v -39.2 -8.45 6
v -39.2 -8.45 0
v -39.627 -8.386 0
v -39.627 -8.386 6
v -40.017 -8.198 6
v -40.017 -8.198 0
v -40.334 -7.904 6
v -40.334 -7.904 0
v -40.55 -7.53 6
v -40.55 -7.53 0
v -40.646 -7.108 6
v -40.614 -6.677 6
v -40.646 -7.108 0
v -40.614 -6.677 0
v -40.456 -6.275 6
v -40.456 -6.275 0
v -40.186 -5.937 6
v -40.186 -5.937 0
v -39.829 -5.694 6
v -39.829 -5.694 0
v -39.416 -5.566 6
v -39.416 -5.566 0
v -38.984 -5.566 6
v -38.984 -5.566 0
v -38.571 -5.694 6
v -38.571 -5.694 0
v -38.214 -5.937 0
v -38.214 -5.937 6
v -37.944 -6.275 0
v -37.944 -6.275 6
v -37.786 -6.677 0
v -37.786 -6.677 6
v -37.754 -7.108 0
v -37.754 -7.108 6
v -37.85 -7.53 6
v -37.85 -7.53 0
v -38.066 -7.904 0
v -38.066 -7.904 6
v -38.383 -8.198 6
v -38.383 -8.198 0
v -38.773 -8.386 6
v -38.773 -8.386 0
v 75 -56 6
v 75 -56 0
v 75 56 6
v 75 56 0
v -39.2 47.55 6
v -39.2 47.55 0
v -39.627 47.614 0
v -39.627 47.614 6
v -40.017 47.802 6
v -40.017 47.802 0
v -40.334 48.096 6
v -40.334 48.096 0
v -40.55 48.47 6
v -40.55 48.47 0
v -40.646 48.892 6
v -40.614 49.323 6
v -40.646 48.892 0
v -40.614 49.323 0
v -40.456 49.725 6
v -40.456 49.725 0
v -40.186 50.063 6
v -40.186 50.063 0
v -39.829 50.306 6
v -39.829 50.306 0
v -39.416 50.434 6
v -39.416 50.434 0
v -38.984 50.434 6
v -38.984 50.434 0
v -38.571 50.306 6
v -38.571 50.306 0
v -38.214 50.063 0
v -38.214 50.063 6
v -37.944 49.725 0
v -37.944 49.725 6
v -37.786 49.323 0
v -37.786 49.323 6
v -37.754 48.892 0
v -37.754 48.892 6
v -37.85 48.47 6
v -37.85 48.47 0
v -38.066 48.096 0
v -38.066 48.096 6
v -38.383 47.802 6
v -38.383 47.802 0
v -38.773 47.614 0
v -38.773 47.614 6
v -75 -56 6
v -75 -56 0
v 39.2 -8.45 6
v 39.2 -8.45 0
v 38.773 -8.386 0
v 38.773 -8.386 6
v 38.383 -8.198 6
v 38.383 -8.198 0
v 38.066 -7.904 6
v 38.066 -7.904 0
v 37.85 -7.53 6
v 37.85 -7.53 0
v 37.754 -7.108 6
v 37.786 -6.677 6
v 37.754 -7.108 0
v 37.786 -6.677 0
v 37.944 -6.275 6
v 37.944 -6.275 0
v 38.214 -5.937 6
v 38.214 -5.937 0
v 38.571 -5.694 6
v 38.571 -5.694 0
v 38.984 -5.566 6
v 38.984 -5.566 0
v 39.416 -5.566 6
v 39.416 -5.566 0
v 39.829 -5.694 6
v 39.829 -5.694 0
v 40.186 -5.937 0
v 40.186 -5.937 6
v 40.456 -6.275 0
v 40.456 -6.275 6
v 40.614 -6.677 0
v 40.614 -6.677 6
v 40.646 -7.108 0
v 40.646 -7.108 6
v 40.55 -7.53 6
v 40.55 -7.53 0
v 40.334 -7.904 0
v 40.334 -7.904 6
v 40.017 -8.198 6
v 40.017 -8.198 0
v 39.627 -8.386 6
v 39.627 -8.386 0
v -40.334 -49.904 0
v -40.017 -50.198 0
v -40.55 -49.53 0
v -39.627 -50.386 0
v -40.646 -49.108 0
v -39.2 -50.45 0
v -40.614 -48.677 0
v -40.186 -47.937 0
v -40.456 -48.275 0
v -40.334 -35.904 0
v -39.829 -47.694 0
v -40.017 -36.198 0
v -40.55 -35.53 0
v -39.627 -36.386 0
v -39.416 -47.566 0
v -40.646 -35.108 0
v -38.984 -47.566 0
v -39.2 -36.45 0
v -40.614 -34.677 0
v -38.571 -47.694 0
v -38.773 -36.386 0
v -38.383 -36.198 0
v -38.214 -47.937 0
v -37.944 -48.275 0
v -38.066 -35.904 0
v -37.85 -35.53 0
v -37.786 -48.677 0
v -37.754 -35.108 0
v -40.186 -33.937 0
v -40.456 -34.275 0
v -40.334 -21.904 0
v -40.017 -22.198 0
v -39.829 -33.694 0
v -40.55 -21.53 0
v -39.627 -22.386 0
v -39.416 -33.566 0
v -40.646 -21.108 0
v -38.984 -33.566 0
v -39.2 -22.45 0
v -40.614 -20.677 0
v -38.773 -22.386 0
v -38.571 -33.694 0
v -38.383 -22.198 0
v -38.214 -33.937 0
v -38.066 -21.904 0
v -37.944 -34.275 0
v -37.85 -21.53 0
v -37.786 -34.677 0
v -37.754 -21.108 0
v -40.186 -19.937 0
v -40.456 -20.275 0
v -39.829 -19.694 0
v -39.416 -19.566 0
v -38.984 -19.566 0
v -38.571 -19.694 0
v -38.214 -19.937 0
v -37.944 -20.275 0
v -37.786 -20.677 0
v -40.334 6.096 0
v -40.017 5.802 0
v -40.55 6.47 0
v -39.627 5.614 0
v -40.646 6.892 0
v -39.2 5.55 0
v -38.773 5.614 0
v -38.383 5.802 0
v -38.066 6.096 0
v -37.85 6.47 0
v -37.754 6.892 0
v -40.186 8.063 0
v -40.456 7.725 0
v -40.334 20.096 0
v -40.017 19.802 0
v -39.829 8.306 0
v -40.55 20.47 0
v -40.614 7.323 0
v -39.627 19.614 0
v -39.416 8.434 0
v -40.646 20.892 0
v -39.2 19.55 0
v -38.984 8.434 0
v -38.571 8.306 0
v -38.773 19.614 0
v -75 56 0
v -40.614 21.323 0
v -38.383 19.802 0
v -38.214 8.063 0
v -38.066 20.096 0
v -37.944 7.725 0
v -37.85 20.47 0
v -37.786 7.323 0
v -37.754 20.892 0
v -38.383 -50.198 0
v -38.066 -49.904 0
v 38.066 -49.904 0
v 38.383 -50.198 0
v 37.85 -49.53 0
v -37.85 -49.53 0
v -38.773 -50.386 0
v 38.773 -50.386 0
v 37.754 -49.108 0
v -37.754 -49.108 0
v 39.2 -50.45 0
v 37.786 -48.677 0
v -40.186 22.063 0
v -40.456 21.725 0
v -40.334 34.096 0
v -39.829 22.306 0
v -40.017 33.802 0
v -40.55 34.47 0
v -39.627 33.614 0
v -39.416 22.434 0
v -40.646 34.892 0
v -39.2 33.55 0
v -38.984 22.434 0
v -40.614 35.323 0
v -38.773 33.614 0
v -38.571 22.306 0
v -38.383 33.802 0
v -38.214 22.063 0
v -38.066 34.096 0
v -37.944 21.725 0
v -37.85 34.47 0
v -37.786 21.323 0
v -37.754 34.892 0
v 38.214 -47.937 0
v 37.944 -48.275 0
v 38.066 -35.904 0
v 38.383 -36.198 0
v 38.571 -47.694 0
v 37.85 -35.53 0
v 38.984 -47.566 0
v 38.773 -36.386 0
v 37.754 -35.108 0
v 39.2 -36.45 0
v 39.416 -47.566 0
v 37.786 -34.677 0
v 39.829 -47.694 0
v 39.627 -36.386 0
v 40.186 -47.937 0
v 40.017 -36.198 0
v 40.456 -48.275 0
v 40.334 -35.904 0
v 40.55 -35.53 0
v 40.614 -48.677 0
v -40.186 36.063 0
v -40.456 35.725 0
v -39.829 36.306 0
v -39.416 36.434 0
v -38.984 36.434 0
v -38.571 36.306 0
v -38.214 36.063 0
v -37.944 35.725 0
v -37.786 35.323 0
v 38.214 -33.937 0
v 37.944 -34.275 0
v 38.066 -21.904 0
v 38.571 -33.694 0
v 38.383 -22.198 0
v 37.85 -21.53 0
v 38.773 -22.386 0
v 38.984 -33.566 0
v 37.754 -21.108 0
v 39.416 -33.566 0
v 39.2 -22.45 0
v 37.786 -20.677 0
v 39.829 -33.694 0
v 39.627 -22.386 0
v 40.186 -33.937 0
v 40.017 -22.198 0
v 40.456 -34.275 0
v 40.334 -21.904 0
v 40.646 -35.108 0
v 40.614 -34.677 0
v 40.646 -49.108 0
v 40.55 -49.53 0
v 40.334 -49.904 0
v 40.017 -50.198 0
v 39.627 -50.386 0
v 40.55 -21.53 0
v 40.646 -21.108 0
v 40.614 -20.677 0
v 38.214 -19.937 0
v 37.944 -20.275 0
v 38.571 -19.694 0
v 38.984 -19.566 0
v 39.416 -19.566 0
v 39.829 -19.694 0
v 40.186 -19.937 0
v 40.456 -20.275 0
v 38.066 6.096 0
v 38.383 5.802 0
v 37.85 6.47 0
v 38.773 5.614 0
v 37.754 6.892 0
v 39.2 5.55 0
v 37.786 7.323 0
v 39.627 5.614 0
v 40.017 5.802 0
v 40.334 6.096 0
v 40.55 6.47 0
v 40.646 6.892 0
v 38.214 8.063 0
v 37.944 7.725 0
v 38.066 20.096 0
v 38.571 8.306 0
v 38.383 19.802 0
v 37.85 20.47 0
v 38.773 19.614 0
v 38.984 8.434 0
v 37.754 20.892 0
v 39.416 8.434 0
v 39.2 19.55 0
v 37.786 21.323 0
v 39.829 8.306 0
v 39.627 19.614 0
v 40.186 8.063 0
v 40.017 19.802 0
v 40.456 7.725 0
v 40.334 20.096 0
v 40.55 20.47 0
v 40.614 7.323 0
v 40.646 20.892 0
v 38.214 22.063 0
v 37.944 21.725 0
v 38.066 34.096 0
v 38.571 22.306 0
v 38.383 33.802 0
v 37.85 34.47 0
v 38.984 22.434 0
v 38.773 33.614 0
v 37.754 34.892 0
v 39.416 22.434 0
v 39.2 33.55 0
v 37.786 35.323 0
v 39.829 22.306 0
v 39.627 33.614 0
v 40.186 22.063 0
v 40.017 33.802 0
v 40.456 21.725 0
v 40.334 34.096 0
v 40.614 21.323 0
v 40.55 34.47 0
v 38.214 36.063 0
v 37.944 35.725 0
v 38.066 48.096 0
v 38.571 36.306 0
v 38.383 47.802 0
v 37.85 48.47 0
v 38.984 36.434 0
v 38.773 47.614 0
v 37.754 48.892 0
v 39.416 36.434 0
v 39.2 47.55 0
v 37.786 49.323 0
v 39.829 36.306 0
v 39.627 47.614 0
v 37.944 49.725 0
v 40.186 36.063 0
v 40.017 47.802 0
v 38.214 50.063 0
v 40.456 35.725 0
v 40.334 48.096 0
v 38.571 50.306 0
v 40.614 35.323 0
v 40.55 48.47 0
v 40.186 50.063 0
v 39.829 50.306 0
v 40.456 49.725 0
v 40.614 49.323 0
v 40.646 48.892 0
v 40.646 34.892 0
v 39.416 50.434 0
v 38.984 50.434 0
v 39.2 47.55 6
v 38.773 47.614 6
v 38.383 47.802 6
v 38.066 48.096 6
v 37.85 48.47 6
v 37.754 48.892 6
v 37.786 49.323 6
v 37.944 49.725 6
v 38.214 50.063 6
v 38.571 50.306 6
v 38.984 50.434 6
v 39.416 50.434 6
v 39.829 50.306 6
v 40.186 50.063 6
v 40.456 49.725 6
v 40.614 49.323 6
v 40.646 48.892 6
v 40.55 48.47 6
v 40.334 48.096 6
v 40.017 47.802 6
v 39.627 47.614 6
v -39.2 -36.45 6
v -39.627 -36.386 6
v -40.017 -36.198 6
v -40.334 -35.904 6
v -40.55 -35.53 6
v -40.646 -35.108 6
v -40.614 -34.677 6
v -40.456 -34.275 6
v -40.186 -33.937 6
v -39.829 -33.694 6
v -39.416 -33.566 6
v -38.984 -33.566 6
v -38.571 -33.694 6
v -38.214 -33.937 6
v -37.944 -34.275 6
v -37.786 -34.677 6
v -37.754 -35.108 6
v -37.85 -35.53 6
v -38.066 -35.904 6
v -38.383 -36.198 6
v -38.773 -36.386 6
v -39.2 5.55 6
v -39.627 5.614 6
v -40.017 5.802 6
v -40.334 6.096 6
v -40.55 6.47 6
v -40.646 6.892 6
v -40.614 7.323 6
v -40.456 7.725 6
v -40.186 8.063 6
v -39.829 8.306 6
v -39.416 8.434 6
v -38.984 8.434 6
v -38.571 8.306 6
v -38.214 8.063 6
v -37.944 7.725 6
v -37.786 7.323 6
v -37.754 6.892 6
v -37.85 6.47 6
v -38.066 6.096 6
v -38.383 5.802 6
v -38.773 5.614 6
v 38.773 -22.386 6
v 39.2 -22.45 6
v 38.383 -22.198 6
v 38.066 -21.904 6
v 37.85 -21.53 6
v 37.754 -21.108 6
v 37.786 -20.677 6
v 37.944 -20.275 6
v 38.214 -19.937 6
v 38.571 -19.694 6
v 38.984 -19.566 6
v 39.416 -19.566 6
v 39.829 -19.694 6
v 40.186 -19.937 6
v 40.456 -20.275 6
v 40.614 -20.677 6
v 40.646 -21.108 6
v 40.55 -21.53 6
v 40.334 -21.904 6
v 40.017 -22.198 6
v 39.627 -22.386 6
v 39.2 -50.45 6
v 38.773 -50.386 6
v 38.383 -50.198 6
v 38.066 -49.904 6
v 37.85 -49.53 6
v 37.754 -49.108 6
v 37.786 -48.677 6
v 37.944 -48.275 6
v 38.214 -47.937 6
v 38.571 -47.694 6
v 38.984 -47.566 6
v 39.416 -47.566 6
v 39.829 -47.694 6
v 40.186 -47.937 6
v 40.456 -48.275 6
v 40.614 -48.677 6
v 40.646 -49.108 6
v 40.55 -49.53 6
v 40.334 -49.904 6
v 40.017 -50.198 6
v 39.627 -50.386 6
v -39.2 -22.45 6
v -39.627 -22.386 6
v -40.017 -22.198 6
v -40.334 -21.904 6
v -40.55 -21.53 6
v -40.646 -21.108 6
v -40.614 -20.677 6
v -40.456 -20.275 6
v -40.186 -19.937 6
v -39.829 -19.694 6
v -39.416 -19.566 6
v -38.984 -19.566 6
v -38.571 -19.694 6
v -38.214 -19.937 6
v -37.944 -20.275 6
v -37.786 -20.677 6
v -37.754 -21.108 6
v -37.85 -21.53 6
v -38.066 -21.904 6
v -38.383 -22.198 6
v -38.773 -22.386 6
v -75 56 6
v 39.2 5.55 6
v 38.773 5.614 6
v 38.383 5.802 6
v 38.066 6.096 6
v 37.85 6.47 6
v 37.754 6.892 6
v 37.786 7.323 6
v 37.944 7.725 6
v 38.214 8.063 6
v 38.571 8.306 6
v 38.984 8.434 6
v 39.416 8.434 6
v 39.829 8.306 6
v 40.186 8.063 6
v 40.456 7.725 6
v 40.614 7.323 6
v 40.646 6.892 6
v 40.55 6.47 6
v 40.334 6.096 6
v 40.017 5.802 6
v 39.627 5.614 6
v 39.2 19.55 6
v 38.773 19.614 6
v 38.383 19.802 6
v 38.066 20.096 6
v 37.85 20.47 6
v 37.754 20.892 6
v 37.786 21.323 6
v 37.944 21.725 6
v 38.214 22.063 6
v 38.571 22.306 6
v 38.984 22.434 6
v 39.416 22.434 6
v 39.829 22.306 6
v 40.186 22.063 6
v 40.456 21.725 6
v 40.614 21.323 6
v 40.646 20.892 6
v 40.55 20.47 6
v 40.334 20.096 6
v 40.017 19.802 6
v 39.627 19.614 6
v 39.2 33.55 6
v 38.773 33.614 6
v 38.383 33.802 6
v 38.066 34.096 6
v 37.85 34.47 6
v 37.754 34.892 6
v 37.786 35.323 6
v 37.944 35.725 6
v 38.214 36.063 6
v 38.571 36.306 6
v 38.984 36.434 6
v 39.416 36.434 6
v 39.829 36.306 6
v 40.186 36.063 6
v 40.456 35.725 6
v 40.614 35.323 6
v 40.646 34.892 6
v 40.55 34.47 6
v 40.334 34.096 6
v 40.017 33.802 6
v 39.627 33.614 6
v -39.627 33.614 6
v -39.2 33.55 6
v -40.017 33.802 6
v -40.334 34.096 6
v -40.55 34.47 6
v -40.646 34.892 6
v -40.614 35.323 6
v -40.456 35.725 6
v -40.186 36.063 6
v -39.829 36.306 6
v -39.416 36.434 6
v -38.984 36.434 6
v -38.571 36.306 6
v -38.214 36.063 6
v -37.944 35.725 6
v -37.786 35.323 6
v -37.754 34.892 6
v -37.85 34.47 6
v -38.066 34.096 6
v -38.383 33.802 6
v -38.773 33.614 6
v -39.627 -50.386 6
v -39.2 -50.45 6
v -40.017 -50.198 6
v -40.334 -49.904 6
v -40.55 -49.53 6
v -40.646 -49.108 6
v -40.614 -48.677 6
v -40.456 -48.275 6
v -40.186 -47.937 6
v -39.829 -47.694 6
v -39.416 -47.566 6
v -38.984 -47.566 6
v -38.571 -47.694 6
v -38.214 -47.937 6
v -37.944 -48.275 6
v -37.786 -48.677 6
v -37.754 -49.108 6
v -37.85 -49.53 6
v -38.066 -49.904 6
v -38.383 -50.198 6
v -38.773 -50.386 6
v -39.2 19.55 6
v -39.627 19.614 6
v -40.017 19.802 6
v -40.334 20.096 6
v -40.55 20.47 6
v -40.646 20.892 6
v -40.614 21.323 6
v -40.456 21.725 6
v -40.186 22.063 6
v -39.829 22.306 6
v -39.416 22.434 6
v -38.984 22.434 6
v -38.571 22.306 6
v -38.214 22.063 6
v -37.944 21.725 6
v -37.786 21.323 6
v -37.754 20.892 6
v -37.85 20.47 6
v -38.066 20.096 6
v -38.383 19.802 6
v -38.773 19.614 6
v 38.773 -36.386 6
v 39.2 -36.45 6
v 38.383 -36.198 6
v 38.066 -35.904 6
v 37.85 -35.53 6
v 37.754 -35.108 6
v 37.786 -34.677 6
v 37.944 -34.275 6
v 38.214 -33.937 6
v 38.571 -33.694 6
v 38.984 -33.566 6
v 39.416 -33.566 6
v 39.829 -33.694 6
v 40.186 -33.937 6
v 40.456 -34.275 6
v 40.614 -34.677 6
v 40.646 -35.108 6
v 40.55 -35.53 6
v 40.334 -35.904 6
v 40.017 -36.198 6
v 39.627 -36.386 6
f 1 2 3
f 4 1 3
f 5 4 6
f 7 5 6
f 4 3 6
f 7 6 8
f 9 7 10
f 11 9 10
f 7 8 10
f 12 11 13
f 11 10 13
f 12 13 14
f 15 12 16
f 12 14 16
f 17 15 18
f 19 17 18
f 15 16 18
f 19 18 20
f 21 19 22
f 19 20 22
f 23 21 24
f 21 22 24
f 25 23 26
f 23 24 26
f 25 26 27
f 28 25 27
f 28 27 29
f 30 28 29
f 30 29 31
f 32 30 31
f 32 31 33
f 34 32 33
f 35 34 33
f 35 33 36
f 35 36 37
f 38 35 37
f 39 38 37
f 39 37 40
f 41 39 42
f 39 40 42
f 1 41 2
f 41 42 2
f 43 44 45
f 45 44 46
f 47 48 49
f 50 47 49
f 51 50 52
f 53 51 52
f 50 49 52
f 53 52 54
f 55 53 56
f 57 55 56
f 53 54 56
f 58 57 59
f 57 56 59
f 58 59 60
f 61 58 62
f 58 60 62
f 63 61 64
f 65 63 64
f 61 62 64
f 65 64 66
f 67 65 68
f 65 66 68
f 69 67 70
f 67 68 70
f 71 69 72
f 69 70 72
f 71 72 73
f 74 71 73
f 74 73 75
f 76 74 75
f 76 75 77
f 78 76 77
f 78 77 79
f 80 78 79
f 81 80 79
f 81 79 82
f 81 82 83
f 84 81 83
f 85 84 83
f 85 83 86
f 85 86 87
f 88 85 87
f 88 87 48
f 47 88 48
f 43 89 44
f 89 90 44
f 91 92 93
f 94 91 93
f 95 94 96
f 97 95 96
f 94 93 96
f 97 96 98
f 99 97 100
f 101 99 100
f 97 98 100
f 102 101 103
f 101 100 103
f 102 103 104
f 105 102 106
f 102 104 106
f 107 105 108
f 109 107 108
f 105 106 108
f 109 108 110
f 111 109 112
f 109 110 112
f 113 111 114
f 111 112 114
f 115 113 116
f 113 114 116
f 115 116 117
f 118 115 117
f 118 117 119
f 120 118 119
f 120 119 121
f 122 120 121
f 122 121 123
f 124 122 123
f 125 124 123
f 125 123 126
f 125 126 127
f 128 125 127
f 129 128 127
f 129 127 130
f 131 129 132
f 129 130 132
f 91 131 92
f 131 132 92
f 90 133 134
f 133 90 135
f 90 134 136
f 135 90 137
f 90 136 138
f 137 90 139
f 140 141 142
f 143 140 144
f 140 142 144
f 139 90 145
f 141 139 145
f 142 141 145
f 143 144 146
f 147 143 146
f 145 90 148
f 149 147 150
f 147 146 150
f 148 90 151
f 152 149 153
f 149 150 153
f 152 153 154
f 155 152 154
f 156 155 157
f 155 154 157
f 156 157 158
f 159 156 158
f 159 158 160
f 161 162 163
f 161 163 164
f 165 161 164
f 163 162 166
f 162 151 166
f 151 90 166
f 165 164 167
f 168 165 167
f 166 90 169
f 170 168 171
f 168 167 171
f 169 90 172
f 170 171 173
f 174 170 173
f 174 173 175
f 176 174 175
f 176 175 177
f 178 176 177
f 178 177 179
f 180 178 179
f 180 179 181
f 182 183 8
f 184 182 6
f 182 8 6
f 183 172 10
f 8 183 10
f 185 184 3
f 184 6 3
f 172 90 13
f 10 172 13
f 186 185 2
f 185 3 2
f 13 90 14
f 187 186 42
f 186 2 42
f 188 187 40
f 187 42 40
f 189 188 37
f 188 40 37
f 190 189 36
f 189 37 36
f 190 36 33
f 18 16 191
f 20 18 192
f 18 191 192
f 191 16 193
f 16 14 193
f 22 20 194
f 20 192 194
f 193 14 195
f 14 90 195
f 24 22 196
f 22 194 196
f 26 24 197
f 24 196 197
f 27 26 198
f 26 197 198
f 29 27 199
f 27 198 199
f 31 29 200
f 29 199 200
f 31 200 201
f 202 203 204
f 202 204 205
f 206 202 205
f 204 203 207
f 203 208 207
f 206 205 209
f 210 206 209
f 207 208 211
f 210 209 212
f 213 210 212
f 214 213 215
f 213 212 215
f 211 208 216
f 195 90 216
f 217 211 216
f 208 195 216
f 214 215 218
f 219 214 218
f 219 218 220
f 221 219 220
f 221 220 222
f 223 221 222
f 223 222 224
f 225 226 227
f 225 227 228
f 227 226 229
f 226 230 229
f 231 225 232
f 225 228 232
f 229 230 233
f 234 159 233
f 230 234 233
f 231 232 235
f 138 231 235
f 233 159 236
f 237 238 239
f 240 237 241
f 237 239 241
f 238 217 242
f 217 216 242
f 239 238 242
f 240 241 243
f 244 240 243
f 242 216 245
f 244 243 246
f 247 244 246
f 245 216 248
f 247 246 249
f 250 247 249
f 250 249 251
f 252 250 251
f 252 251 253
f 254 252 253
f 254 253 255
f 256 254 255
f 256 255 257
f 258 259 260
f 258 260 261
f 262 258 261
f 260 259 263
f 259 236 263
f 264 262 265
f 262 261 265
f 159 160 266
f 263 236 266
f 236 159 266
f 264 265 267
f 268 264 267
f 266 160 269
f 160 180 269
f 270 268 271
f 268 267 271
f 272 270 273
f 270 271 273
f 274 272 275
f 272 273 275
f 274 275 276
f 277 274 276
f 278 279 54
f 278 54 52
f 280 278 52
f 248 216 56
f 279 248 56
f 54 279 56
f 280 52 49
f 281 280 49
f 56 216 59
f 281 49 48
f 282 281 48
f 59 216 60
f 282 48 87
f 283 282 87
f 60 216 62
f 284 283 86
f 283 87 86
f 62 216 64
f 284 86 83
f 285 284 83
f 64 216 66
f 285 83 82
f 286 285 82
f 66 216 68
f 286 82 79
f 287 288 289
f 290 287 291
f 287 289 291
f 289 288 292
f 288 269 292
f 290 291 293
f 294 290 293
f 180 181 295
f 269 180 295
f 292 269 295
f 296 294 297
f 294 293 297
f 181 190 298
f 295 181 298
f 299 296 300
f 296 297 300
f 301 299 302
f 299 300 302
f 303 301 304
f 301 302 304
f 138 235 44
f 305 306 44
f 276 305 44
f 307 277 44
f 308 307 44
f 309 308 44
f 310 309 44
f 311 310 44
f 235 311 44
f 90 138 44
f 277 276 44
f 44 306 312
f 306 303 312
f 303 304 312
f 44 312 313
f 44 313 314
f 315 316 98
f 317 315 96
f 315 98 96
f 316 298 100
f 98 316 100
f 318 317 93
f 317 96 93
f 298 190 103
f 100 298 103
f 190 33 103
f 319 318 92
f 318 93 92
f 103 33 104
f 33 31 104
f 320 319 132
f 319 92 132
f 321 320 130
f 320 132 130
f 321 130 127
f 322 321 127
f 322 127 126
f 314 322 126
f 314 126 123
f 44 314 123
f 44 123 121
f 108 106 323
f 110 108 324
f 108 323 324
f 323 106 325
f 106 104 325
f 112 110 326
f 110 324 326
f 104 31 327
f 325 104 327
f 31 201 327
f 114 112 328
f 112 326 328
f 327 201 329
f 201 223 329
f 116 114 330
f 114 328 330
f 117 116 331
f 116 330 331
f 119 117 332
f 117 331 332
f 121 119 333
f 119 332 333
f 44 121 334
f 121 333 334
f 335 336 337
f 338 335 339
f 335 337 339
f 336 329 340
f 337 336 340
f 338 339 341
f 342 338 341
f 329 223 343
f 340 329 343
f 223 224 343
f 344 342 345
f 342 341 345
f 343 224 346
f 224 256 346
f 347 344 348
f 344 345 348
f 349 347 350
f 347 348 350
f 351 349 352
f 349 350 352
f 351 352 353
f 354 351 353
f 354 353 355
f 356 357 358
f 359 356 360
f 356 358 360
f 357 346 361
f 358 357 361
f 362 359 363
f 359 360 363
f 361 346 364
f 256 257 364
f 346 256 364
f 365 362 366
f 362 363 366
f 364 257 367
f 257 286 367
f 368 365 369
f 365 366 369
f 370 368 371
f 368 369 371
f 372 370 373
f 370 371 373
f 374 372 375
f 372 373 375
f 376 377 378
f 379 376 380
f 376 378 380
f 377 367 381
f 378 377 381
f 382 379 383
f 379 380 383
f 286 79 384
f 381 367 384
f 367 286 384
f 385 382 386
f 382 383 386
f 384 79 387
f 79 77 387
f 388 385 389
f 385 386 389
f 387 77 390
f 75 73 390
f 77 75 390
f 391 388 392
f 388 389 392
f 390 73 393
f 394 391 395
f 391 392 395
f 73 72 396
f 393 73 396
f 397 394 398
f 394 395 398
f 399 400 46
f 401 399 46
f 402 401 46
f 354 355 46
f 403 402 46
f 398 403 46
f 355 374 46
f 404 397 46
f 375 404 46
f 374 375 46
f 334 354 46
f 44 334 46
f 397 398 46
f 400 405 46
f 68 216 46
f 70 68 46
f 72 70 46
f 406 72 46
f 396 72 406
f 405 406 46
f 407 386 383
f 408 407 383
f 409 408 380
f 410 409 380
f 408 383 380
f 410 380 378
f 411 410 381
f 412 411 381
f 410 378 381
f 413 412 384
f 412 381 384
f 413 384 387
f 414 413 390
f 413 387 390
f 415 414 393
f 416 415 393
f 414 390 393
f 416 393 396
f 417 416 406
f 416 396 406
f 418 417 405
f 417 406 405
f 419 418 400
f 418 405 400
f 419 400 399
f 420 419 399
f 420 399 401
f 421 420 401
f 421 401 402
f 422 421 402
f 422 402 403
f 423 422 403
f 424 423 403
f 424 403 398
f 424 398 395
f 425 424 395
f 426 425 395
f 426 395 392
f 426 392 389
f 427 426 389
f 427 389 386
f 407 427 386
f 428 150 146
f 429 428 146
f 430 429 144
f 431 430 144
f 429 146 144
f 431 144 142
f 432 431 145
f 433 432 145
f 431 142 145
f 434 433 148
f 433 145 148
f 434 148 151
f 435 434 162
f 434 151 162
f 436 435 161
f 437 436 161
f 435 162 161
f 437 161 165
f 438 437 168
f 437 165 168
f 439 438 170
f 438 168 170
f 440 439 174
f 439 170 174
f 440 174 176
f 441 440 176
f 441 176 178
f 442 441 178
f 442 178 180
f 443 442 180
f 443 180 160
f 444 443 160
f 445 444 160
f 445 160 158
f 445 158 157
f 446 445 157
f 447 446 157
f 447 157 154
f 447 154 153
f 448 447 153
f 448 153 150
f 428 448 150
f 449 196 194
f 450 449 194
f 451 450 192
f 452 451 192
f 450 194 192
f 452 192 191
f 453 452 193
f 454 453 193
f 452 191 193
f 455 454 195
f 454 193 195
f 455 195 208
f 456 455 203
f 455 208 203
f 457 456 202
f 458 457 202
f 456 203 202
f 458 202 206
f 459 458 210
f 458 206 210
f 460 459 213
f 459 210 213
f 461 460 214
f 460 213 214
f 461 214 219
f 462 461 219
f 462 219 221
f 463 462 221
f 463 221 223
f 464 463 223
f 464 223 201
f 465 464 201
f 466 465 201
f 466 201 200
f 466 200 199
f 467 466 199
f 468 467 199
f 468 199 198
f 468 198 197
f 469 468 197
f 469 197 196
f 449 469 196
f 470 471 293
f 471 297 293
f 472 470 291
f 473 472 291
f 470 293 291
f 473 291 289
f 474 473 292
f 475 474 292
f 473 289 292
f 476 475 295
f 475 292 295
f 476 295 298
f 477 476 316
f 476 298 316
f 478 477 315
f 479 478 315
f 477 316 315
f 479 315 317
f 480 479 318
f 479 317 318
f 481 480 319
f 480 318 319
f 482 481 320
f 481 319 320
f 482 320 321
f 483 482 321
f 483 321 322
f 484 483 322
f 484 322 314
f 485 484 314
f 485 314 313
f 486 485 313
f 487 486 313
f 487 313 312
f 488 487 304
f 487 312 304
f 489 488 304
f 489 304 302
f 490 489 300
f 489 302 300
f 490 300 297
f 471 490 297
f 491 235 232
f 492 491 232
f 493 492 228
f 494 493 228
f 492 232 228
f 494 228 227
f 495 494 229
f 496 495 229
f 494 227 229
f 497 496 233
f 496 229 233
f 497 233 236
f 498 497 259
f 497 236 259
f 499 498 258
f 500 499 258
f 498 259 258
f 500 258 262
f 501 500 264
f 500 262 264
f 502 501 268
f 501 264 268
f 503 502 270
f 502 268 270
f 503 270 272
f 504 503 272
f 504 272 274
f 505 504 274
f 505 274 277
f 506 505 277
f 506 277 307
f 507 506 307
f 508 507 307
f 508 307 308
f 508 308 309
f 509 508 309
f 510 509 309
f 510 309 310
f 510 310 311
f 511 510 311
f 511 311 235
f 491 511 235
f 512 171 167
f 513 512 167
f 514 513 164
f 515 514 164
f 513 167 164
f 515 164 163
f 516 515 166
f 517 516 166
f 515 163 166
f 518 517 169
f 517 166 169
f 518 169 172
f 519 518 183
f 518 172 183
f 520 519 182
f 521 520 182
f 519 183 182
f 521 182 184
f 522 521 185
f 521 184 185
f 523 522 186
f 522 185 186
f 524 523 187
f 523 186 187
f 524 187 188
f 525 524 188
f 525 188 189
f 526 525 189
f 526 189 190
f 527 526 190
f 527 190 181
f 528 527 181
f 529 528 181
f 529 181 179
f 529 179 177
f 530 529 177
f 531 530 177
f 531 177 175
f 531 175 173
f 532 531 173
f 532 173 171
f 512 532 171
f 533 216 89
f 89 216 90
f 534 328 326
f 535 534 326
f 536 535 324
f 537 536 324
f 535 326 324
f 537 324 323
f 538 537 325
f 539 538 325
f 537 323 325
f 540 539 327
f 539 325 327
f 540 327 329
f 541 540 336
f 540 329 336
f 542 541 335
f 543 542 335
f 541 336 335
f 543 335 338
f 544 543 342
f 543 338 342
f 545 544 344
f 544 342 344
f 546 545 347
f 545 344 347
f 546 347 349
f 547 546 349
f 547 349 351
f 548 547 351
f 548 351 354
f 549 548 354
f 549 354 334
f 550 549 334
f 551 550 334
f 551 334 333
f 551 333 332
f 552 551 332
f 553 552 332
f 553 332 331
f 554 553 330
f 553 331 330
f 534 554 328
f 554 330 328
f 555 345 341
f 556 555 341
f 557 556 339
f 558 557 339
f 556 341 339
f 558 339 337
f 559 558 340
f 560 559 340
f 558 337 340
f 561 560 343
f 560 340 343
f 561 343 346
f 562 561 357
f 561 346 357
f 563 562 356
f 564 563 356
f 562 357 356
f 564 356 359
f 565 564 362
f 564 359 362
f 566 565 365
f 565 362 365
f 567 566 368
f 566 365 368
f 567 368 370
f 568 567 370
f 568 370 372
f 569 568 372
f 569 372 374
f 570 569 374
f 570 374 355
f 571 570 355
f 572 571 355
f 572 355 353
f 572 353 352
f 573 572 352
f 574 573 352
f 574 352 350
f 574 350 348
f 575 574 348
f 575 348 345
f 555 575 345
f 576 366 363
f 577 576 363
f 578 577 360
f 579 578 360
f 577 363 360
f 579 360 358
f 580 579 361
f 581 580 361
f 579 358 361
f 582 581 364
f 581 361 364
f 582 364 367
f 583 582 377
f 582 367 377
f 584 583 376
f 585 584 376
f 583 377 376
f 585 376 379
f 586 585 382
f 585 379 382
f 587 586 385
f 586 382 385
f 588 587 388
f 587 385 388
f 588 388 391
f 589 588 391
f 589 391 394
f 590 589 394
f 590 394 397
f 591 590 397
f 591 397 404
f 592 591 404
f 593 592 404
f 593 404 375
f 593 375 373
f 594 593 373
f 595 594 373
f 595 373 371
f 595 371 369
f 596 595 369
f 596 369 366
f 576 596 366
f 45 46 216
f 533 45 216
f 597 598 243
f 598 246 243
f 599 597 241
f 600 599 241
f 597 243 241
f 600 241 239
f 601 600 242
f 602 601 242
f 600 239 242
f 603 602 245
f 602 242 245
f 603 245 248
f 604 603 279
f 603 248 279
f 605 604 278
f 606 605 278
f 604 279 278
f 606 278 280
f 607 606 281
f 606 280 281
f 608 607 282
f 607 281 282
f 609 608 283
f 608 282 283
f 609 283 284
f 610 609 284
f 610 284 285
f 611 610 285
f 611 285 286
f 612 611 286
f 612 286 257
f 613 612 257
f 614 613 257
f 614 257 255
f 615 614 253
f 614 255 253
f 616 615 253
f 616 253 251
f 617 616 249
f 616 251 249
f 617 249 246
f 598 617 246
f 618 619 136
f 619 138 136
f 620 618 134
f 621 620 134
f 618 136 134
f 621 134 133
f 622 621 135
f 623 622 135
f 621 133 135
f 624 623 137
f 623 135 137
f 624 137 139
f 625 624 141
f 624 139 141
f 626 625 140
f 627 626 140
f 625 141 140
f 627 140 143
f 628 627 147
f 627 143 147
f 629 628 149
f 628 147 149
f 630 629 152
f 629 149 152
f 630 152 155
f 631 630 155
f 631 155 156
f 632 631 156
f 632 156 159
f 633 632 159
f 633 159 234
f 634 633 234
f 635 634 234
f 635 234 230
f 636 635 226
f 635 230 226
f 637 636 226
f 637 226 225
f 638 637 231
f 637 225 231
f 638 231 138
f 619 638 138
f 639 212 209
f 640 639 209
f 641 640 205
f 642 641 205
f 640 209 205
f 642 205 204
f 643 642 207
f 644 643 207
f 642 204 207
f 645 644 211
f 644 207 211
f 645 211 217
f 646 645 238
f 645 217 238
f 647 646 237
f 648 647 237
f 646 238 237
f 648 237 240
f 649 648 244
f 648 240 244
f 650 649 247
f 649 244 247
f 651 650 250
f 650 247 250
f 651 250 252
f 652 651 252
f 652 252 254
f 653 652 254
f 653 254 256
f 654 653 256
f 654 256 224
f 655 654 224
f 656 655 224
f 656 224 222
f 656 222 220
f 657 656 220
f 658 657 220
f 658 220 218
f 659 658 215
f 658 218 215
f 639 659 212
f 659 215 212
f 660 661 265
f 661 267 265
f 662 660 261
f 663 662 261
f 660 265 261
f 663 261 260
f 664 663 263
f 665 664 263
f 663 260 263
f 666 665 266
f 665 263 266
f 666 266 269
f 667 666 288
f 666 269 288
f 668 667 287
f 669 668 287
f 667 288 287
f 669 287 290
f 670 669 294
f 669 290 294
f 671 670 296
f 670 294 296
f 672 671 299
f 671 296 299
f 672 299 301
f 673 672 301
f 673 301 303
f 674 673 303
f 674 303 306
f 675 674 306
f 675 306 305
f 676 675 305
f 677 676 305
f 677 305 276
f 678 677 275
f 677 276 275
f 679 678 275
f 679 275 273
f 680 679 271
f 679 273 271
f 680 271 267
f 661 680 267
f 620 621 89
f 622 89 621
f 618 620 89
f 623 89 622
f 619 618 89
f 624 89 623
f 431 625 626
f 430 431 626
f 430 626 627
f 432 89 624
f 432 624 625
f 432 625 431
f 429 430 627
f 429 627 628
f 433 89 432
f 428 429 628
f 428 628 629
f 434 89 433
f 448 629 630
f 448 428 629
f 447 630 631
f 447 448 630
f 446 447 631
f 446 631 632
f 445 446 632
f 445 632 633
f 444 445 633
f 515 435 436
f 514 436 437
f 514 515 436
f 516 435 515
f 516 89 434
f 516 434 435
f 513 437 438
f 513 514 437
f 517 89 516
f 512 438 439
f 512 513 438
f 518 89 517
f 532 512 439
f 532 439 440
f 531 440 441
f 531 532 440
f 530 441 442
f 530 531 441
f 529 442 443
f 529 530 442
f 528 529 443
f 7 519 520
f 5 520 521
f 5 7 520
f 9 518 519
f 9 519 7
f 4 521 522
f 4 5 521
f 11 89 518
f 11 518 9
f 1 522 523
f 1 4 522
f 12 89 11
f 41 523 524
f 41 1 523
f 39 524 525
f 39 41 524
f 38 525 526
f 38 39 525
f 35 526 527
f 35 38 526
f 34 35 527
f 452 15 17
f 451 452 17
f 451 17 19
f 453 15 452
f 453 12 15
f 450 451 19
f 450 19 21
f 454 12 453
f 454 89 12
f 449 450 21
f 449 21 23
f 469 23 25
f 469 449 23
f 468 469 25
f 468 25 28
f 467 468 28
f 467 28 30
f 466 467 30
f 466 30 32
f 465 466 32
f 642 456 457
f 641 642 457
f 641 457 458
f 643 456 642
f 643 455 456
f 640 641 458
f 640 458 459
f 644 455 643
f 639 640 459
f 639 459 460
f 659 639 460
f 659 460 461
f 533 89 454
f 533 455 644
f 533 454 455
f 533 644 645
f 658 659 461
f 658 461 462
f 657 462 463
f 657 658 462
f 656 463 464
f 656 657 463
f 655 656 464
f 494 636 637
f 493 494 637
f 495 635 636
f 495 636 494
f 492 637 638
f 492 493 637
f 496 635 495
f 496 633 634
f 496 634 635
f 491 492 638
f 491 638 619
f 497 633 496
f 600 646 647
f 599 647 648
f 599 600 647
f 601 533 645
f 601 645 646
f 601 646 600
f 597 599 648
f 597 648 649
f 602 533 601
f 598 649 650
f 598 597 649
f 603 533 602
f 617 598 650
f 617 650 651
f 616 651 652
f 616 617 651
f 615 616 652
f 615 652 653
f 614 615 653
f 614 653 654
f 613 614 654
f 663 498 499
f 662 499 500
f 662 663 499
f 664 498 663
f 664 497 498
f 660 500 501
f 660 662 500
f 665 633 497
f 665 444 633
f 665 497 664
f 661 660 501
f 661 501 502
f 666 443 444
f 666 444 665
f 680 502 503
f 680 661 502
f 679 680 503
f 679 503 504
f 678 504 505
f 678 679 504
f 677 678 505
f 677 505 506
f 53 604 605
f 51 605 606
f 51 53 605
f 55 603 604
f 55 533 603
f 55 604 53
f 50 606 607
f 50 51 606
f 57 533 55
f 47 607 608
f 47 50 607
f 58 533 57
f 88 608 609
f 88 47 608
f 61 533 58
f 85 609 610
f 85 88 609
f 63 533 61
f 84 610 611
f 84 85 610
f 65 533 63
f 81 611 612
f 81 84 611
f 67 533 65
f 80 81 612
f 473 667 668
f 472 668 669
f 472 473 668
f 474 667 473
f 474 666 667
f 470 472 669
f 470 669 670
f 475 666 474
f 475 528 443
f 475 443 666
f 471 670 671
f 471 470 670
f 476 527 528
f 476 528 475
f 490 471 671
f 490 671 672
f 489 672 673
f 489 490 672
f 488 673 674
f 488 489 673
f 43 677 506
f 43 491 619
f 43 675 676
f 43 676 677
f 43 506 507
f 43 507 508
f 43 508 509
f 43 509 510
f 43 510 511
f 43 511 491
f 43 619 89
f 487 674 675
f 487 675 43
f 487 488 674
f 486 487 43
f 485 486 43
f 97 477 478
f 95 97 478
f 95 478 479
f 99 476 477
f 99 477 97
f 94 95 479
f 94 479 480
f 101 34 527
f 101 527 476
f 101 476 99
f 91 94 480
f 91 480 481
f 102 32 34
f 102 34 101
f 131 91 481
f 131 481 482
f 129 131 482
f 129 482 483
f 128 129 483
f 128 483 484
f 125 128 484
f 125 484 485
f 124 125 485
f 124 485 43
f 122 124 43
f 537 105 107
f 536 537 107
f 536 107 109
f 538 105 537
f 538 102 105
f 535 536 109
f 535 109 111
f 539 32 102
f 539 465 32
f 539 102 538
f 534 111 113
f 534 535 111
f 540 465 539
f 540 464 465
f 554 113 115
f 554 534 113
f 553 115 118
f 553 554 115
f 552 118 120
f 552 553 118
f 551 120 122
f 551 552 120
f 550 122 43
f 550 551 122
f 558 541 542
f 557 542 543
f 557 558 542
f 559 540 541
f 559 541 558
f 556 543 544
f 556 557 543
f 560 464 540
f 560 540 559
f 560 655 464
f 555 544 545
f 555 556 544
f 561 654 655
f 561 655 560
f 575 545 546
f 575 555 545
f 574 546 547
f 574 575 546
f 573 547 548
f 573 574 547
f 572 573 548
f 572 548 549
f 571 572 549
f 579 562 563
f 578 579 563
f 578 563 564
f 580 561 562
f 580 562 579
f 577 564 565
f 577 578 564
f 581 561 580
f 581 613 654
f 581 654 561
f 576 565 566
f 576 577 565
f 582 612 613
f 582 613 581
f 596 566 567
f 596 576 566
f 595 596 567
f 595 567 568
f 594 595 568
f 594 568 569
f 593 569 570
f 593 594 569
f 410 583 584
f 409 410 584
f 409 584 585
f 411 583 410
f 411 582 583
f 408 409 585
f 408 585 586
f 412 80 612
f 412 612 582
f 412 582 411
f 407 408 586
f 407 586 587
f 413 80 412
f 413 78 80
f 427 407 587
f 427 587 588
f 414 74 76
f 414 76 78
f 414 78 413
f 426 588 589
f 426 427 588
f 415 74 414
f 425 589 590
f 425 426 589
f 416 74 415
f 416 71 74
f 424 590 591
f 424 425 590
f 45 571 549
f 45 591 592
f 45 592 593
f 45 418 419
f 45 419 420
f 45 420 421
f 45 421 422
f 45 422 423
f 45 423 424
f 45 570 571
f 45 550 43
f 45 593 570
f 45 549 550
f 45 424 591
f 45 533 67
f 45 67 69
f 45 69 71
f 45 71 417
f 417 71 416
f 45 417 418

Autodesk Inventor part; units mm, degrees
ref_plane "YZ Plane" through (0, 0, 0) normal (1, 0, 0) x (0, 1, 0)
ref_plane "XZ Plane" through (0, 0, 0) normal (0, 1, 0) x (-1, 0, 0)
ref_plane "XY Plane" through (0, 0, 0) normal (0, 0, 1) x (1, 0, 0)
sketch "Sketch1" plane through (0, 0, 0) normal (0, 0, 1) x (1, 0, 0)
  line L0 (-75, -56) -> (75, -56)
  line L1 (75, -56) -> (75, 56)
  line L2 (75, 56) -> (-75, 56)
  line L3 (-75, 56) -> (-75, -56)
  line L4 (-75, -56) -> (75, 56) construction
  line L5 (75, -56) -> (-75, 56) construction
  point P0 (0, 0)
  dimension "d0" = 150
  dimension "d1" = 112
extrude "Extrusion1" add sketch "Sketch1" along normal blind 6
sketch "Sketch2" plane through (0, 0, 6) normal (0, 0, 1) x (1, 0, 0)
  line L0 (-75, -56) -> (75, -56) projected
  line L1 (75, -56) -> (75, 56) projected
  line L2 (75, 56) -> (-75, 56) projected
  line L3 (-75, 56) -> (-75, -56) projected
  line L4 (-39.2, 7) -> (39.2, 7)
  point P0 (0, 0)
  dimension "d4" = 78.4
  dimension "d13" = 7
  dimension "d14" = 39.2
hole "Hole1" at (-39.2, 7, 6) at (39.2, 7, 6) direction (0, 0, -1) diameter 2.9 end through all clearance for "Flat Head Machine Screw" size "M2.5" standard "Ansi Metric M Profile"
pattern_linear "Rectangular Pattern1" count 8 spacing 14 along (0, -1, 0) of "Hole1" first direction both ways yes
equation "\"d13\" = 0.5 * tileThickness + 0.5 * tileSeperation"
equation "\"d14\" = 0.5 * d4"
equation "\"d17\" = tileSeperation + tileThickness"
equation "\"tileSeperation\" = 7"
equation "\"tileThickness\" = 7"
properties part number "holderStack" material "Polycarbonate, Clear"
